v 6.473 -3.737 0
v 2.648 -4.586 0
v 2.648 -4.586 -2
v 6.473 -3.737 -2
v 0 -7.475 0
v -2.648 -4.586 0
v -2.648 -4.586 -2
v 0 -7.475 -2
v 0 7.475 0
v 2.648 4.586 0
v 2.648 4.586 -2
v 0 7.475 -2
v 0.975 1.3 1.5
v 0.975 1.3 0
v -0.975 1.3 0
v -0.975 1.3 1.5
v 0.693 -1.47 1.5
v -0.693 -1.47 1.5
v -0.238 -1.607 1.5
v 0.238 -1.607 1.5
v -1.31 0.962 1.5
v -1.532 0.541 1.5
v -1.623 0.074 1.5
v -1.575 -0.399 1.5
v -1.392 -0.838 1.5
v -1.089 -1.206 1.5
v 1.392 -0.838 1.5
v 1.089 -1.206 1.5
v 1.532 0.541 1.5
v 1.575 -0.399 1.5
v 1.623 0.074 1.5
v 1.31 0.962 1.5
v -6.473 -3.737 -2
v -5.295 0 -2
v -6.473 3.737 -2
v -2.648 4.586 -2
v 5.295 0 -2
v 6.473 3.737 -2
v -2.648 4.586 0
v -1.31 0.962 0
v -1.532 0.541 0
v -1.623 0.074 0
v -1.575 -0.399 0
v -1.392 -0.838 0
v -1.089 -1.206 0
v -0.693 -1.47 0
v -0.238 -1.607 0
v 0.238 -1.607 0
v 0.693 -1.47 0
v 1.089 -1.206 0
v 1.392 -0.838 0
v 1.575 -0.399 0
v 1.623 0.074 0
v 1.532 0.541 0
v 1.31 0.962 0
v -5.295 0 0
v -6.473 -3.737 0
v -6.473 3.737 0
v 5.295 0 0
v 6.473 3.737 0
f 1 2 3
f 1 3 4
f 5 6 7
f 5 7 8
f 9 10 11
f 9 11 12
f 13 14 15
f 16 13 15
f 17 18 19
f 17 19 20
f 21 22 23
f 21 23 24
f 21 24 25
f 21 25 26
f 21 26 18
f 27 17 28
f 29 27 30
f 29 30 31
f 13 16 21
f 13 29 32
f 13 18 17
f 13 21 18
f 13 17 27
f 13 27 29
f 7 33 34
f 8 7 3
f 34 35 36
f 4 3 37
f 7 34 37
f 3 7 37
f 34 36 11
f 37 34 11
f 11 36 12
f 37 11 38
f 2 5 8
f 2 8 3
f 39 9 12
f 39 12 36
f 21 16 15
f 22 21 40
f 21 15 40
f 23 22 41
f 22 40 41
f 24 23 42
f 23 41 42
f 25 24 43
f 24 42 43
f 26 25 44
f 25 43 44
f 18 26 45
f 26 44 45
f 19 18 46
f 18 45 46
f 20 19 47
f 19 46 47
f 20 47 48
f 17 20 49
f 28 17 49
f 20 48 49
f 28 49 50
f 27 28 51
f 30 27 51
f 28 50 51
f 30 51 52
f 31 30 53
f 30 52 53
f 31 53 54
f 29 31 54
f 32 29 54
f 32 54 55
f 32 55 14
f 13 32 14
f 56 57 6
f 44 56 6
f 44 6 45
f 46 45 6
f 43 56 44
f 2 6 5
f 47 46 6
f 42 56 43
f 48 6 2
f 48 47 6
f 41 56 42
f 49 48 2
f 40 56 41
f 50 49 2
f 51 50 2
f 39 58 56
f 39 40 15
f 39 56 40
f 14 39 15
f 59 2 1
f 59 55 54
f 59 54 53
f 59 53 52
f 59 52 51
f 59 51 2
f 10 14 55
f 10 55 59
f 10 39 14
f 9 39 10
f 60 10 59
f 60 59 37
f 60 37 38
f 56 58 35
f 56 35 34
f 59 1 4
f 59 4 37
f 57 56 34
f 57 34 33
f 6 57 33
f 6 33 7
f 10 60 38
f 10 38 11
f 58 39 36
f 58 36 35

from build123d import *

# Parameters (mm, degrees)
BOSS_EXTRUDE1_DEPTH      = 2
BOSS_EXTRUDE2_DEPTH      = 1.5
BOSS_EXTRUDE2_DEPTH_BACK = 2


with BuildPart() as part:
    # Sketch1 → Boss-Extrude1 (new body)
    with BuildSketch(Plane.XY):
        Polygon((0, -7.474945526), (2.647536041, -4.585666938), (6.473492718, -3.737472763), (5.295072082, 0), (6.473492718, 3.737472763), (2.647536041, 4.585666938), (0, 7.474945526), (-2.647536041, 4.585666938), (-6.473492718, 3.737472763), (-5.295072082, 0), (-6.473492718, -3.737472763), (-2.647536041, -4.585666938), align=None)
    extrude(amount=-BOSS_EXTRUDE1_DEPTH)

    # Sketch1<4> → Boss-Extrude2 (add, two sides: drawn at the far end of the back side and taken through both)
    with BuildSketch(Plane.XY.offset(-BOSS_EXTRUDE2_DEPTH_BACK)):
        with BuildLine():
            Line((0.975, 1.3), (-0.975, 1.3))
            ThreePointArc((-0.975, 1.3), (0, -1.625), (0.975, 1.3))
        make_face()
    extrude(amount=BOSS_EXTRUDE2_DEPTH + BOSS_EXTRUDE2_DEPTH_BACK)


solid = part.part
